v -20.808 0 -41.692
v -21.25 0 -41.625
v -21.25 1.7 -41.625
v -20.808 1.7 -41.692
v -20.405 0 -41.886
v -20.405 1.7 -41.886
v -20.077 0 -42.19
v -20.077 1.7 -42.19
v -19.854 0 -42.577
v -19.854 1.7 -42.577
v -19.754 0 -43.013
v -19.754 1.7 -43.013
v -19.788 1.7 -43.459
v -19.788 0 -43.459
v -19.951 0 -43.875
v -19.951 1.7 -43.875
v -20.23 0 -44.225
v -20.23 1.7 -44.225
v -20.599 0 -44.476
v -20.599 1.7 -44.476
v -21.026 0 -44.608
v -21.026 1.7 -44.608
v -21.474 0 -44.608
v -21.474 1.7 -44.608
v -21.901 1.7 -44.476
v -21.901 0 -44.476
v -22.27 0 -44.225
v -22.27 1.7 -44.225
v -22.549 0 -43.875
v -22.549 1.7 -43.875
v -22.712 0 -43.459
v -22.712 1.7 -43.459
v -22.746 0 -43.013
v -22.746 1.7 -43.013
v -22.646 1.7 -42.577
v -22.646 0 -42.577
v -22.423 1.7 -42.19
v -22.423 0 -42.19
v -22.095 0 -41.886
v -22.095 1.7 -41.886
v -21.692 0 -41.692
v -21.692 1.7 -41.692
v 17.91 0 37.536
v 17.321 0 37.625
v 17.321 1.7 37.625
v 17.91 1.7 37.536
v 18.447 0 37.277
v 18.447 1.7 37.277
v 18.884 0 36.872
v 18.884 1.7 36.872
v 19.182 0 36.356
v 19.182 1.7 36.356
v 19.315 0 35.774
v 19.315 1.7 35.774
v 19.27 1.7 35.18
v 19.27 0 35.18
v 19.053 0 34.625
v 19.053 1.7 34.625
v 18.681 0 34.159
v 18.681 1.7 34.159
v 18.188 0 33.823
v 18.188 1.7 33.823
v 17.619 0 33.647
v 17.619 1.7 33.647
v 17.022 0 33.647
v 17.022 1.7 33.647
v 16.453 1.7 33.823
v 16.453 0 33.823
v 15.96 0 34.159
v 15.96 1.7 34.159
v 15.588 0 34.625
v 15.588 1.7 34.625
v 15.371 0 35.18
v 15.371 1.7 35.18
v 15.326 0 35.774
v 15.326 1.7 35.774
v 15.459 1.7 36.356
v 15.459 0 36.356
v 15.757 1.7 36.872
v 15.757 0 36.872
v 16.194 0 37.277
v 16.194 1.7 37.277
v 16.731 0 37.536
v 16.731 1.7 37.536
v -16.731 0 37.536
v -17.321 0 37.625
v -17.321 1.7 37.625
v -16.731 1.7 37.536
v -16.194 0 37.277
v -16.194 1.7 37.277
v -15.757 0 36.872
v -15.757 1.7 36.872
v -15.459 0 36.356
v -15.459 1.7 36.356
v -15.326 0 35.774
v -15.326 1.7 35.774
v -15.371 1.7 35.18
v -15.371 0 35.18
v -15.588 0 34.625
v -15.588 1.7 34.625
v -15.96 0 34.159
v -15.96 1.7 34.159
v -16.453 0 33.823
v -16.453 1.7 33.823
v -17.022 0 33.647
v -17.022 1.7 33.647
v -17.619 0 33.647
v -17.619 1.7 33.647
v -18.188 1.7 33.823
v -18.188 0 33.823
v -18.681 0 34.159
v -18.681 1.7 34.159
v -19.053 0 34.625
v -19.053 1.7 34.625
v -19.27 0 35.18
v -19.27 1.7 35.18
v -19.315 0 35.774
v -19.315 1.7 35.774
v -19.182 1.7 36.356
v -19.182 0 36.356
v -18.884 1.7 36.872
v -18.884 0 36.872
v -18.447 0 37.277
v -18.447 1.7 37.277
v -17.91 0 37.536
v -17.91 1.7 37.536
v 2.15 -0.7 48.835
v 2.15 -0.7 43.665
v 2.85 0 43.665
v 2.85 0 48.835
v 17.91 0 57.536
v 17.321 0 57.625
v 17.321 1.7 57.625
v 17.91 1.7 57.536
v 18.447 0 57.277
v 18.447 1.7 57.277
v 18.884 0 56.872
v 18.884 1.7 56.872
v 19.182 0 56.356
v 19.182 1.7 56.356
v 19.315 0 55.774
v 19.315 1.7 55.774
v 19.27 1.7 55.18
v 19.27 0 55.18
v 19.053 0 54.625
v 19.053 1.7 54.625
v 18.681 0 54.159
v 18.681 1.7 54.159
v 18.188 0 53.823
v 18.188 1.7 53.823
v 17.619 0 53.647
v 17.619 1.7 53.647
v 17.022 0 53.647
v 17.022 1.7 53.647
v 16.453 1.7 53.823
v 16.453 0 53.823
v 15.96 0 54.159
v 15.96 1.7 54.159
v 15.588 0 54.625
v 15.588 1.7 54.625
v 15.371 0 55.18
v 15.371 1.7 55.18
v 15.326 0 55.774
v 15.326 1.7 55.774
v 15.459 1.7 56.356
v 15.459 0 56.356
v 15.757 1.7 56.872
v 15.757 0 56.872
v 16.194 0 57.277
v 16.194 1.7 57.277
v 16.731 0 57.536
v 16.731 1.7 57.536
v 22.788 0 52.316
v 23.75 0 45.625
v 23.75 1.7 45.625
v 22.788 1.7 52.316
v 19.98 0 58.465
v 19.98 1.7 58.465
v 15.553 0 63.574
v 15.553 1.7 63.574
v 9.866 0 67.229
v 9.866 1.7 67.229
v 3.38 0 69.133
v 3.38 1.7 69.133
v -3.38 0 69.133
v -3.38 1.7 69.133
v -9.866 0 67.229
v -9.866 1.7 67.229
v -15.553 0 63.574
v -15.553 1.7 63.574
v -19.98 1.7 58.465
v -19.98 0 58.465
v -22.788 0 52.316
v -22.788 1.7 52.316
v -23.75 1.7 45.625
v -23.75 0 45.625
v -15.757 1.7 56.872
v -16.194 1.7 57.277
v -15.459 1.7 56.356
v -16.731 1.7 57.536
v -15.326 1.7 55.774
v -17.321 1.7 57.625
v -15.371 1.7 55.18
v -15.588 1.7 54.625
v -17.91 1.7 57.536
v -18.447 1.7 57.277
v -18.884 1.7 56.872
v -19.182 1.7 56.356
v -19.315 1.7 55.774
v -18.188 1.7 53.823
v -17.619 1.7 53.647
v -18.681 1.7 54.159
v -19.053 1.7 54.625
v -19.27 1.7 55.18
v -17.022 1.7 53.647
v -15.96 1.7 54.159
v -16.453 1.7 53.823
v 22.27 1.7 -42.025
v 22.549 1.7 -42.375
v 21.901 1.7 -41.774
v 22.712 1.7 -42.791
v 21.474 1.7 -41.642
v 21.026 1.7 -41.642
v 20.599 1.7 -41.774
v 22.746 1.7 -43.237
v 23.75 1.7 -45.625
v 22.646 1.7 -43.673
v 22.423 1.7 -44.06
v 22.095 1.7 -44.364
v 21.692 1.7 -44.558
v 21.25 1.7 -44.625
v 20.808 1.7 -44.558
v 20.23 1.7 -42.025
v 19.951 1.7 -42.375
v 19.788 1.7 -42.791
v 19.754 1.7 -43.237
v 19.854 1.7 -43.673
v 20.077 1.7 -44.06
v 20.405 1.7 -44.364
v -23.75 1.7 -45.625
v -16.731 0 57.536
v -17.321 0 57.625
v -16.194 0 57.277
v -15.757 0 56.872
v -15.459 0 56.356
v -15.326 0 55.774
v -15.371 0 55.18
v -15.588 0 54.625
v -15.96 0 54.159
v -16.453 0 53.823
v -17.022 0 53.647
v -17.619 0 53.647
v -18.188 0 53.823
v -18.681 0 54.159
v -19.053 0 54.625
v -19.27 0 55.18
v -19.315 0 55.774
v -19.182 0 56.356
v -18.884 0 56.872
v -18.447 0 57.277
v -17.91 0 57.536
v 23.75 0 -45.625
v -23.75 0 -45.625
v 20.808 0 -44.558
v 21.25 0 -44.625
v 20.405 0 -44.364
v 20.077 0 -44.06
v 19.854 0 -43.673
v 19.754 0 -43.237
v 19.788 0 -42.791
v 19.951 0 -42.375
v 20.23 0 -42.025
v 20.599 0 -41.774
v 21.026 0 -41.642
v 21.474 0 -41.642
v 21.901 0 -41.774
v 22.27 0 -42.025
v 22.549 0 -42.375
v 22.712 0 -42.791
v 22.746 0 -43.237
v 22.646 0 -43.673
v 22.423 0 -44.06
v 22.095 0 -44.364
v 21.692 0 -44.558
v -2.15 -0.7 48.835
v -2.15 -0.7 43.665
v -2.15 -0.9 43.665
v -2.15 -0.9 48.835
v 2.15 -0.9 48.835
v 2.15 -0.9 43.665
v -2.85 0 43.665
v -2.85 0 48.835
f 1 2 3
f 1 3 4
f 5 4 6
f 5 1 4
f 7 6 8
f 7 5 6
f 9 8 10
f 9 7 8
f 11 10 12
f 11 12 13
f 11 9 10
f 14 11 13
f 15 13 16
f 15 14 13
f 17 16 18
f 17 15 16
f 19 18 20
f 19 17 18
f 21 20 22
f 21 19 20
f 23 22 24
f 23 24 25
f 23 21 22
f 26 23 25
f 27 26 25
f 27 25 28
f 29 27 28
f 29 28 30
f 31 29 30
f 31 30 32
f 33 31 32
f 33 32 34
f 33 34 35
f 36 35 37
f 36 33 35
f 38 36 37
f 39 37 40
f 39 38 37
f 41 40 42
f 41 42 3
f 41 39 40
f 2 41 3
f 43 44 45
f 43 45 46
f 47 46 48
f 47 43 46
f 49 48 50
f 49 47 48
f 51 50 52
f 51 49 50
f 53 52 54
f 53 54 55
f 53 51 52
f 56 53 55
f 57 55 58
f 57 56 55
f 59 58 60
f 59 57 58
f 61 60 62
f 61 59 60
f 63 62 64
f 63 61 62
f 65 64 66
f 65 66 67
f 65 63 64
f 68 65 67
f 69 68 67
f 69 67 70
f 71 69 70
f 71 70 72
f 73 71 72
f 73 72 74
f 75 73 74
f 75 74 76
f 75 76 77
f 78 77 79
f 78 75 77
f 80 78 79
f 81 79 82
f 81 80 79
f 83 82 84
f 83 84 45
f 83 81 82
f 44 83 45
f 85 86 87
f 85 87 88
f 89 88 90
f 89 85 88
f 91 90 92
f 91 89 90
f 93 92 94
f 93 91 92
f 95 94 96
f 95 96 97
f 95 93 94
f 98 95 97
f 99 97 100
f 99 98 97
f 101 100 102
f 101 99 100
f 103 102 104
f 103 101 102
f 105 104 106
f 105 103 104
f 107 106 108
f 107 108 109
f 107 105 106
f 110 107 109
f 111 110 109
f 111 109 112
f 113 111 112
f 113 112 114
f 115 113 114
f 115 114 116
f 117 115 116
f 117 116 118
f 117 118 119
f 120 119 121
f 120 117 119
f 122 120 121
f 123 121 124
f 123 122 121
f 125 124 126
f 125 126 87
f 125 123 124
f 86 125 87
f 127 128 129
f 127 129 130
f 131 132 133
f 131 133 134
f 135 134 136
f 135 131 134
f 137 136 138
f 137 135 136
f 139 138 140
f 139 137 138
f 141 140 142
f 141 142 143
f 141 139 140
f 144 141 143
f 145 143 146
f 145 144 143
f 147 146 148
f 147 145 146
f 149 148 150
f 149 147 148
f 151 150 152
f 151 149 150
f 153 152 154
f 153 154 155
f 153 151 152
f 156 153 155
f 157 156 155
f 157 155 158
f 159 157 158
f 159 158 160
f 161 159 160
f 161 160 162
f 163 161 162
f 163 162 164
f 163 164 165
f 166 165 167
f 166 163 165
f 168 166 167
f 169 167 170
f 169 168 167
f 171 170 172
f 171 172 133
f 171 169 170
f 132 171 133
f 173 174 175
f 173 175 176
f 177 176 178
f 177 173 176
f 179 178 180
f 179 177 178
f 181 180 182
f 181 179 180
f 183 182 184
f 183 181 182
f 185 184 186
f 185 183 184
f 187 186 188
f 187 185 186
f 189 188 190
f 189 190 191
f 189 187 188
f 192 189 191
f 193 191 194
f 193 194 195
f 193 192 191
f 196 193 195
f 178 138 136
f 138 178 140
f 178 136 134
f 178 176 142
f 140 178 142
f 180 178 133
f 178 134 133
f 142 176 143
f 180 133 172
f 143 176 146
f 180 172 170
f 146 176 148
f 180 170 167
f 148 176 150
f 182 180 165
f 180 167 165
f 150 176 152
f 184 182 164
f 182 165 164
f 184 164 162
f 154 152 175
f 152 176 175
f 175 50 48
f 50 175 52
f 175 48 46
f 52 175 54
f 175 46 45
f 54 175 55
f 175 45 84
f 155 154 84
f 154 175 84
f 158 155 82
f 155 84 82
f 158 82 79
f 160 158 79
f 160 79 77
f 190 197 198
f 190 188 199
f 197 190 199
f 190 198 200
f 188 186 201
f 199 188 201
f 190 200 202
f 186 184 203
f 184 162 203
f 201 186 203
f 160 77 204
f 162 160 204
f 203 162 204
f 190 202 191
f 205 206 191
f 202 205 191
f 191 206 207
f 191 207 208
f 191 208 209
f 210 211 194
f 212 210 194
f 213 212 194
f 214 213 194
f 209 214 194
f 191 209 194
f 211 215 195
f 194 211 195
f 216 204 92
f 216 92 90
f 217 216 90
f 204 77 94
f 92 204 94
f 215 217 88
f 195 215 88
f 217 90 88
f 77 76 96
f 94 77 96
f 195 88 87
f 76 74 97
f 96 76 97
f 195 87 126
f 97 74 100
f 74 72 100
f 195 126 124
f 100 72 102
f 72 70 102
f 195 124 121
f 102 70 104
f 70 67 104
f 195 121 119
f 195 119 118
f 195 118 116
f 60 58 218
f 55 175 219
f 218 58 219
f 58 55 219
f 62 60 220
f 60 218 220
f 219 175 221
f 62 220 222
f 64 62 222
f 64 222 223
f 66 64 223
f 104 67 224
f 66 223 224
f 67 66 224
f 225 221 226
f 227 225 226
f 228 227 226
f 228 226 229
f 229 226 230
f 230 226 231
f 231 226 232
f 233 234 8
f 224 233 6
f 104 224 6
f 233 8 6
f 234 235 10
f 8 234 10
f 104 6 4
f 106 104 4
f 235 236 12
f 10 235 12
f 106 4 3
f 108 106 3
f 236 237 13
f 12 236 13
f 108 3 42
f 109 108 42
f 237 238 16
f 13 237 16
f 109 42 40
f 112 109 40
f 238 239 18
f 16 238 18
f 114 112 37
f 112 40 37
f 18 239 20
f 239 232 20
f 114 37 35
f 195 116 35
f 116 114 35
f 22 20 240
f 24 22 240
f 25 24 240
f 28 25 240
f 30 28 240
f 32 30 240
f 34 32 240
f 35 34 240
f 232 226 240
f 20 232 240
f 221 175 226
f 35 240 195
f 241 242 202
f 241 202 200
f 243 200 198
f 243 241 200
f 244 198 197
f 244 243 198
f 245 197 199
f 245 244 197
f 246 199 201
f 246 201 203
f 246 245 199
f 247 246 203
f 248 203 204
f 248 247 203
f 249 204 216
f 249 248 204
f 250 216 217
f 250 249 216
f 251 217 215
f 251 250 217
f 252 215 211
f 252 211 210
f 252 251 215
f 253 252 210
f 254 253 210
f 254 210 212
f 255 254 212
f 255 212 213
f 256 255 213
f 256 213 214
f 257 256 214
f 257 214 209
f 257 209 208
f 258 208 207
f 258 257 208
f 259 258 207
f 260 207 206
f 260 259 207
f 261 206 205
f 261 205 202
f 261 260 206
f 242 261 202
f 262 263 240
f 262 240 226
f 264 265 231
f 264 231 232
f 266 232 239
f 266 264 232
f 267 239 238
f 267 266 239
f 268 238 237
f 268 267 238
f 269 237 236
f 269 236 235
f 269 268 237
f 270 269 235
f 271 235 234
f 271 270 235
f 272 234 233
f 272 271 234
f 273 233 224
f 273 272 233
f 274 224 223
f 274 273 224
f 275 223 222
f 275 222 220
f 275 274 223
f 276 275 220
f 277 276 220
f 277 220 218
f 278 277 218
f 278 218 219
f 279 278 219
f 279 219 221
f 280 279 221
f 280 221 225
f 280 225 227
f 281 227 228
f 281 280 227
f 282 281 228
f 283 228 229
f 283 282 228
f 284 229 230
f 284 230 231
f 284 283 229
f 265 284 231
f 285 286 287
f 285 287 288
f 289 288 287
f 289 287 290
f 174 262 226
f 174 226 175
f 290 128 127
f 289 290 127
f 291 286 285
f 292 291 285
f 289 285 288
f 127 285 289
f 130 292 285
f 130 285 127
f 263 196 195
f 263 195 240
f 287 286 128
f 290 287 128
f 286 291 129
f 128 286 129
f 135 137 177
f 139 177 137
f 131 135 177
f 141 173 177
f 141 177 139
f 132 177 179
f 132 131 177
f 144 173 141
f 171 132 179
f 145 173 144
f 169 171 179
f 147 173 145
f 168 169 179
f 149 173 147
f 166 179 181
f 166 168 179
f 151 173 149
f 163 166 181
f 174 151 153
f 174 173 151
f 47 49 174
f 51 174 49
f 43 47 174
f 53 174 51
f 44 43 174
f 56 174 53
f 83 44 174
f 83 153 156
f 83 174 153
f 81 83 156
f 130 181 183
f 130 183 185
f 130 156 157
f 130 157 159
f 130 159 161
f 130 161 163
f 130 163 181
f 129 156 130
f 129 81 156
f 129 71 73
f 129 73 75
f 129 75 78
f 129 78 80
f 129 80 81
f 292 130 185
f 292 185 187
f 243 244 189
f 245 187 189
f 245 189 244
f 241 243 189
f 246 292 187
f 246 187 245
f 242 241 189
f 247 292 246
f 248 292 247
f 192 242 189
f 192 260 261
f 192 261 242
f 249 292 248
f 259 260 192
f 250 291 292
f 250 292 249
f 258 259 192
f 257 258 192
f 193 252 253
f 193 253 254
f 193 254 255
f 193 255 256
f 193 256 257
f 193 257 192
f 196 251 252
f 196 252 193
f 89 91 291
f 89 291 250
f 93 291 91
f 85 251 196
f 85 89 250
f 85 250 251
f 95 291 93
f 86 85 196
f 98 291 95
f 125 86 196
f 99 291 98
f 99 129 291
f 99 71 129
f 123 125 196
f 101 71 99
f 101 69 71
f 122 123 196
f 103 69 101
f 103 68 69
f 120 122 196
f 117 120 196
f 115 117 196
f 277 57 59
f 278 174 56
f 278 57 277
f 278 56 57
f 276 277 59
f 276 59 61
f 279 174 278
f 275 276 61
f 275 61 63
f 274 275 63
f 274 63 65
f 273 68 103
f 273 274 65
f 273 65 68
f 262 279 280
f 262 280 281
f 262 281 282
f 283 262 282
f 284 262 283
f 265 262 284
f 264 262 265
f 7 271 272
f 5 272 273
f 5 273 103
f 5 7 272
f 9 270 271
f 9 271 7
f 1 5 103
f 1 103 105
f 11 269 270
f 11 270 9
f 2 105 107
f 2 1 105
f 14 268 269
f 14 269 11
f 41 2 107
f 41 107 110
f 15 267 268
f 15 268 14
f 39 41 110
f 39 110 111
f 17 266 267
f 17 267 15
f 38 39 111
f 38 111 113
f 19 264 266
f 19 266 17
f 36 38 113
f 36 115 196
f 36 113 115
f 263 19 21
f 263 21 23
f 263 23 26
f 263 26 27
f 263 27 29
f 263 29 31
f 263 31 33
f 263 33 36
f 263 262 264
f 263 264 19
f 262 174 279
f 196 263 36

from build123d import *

# Parameters (mm, degrees)
ESBO_O1_R                = 1.5
ESBO_O1_R_2              = 2
RESSALTO_EXTRUS_O1_DEPTH = 1.7
ESBO_O2_W                = 4.3
ESBO_O2_H                = 5.17
RESSALTO_EXTRUS_O2_DEPTH = 0.9
CHANFRO1_SIZE            = 0.7


with BuildPart() as part:
    # Esboço1 → Ressalto-extrusão1 (new body)
    with BuildSketch(Plane(origin=(0, 0, 0), x_dir=(1, 0, 0), z_dir=(0, 1, 0))):
        with BuildLine():
            Line((-23.75, 45.625), (23.75, 45.625))
            Line((23.75, 45.625), (23.75, -45.625))
            ThreePointArc((23.75, -45.625), (0, -69.375), (-23.75, -45.625))
            Line((-23.75, -45.625), (-23.75, 45.625))
        make_face()
        with Locations(Location((-21.25, 43.125, 0), (0, 0, 270))):
            Circle(ESBO_O1_R, mode=Mode.SUBTRACT)
        with Locations(Location((21.25, 43.125, 0), (0, 0, 90))):
            Circle(ESBO_O1_R, mode=Mode.SUBTRACT)
        with Locations(Location((17.320508076, -35.625, 0), (0, 0, 270))):
            Circle(ESBO_O1_R_2, mode=Mode.SUBTRACT)
        with Locations(Location((17.320508076, -55.625, 0), (0, 0, 270))):
            Circle(ESBO_O1_R_2, mode=Mode.SUBTRACT)
        with Locations(Location((-17.320508076, -55.625, 0), (0, 0, 270))):
            Circle(ESBO_O1_R_2, mode=Mode.SUBTRACT)
        with Locations(Location((-17.320508076, -35.625, 0), (0, 0, 270))):
            Circle(ESBO_O1_R_2, mode=Mode.SUBTRACT)
    extrude(amount=RESSALTO_EXTRUS_O1_DEPTH)

    # Esboço2 → Ressalto-extrusão2 (add)
    with BuildSketch(Plane.XZ):
        with Locations((0, 46.25)):
            Rectangle(ESBO_O2_W, ESBO_O2_H)
    extrude(amount=RESSALTO_EXTRUS_O2_DEPTH)

    # Chanfro1
    chanfro1_edges = [part.edges().sort_by_distance(p)[0] for p in [
        (2.15, 0, 46.25),
        (-2.15, 0, 46.25),
    ]]
    chamfer(chanfro1_edges, length=CHANFRO1_SIZE)


solid = part.part
